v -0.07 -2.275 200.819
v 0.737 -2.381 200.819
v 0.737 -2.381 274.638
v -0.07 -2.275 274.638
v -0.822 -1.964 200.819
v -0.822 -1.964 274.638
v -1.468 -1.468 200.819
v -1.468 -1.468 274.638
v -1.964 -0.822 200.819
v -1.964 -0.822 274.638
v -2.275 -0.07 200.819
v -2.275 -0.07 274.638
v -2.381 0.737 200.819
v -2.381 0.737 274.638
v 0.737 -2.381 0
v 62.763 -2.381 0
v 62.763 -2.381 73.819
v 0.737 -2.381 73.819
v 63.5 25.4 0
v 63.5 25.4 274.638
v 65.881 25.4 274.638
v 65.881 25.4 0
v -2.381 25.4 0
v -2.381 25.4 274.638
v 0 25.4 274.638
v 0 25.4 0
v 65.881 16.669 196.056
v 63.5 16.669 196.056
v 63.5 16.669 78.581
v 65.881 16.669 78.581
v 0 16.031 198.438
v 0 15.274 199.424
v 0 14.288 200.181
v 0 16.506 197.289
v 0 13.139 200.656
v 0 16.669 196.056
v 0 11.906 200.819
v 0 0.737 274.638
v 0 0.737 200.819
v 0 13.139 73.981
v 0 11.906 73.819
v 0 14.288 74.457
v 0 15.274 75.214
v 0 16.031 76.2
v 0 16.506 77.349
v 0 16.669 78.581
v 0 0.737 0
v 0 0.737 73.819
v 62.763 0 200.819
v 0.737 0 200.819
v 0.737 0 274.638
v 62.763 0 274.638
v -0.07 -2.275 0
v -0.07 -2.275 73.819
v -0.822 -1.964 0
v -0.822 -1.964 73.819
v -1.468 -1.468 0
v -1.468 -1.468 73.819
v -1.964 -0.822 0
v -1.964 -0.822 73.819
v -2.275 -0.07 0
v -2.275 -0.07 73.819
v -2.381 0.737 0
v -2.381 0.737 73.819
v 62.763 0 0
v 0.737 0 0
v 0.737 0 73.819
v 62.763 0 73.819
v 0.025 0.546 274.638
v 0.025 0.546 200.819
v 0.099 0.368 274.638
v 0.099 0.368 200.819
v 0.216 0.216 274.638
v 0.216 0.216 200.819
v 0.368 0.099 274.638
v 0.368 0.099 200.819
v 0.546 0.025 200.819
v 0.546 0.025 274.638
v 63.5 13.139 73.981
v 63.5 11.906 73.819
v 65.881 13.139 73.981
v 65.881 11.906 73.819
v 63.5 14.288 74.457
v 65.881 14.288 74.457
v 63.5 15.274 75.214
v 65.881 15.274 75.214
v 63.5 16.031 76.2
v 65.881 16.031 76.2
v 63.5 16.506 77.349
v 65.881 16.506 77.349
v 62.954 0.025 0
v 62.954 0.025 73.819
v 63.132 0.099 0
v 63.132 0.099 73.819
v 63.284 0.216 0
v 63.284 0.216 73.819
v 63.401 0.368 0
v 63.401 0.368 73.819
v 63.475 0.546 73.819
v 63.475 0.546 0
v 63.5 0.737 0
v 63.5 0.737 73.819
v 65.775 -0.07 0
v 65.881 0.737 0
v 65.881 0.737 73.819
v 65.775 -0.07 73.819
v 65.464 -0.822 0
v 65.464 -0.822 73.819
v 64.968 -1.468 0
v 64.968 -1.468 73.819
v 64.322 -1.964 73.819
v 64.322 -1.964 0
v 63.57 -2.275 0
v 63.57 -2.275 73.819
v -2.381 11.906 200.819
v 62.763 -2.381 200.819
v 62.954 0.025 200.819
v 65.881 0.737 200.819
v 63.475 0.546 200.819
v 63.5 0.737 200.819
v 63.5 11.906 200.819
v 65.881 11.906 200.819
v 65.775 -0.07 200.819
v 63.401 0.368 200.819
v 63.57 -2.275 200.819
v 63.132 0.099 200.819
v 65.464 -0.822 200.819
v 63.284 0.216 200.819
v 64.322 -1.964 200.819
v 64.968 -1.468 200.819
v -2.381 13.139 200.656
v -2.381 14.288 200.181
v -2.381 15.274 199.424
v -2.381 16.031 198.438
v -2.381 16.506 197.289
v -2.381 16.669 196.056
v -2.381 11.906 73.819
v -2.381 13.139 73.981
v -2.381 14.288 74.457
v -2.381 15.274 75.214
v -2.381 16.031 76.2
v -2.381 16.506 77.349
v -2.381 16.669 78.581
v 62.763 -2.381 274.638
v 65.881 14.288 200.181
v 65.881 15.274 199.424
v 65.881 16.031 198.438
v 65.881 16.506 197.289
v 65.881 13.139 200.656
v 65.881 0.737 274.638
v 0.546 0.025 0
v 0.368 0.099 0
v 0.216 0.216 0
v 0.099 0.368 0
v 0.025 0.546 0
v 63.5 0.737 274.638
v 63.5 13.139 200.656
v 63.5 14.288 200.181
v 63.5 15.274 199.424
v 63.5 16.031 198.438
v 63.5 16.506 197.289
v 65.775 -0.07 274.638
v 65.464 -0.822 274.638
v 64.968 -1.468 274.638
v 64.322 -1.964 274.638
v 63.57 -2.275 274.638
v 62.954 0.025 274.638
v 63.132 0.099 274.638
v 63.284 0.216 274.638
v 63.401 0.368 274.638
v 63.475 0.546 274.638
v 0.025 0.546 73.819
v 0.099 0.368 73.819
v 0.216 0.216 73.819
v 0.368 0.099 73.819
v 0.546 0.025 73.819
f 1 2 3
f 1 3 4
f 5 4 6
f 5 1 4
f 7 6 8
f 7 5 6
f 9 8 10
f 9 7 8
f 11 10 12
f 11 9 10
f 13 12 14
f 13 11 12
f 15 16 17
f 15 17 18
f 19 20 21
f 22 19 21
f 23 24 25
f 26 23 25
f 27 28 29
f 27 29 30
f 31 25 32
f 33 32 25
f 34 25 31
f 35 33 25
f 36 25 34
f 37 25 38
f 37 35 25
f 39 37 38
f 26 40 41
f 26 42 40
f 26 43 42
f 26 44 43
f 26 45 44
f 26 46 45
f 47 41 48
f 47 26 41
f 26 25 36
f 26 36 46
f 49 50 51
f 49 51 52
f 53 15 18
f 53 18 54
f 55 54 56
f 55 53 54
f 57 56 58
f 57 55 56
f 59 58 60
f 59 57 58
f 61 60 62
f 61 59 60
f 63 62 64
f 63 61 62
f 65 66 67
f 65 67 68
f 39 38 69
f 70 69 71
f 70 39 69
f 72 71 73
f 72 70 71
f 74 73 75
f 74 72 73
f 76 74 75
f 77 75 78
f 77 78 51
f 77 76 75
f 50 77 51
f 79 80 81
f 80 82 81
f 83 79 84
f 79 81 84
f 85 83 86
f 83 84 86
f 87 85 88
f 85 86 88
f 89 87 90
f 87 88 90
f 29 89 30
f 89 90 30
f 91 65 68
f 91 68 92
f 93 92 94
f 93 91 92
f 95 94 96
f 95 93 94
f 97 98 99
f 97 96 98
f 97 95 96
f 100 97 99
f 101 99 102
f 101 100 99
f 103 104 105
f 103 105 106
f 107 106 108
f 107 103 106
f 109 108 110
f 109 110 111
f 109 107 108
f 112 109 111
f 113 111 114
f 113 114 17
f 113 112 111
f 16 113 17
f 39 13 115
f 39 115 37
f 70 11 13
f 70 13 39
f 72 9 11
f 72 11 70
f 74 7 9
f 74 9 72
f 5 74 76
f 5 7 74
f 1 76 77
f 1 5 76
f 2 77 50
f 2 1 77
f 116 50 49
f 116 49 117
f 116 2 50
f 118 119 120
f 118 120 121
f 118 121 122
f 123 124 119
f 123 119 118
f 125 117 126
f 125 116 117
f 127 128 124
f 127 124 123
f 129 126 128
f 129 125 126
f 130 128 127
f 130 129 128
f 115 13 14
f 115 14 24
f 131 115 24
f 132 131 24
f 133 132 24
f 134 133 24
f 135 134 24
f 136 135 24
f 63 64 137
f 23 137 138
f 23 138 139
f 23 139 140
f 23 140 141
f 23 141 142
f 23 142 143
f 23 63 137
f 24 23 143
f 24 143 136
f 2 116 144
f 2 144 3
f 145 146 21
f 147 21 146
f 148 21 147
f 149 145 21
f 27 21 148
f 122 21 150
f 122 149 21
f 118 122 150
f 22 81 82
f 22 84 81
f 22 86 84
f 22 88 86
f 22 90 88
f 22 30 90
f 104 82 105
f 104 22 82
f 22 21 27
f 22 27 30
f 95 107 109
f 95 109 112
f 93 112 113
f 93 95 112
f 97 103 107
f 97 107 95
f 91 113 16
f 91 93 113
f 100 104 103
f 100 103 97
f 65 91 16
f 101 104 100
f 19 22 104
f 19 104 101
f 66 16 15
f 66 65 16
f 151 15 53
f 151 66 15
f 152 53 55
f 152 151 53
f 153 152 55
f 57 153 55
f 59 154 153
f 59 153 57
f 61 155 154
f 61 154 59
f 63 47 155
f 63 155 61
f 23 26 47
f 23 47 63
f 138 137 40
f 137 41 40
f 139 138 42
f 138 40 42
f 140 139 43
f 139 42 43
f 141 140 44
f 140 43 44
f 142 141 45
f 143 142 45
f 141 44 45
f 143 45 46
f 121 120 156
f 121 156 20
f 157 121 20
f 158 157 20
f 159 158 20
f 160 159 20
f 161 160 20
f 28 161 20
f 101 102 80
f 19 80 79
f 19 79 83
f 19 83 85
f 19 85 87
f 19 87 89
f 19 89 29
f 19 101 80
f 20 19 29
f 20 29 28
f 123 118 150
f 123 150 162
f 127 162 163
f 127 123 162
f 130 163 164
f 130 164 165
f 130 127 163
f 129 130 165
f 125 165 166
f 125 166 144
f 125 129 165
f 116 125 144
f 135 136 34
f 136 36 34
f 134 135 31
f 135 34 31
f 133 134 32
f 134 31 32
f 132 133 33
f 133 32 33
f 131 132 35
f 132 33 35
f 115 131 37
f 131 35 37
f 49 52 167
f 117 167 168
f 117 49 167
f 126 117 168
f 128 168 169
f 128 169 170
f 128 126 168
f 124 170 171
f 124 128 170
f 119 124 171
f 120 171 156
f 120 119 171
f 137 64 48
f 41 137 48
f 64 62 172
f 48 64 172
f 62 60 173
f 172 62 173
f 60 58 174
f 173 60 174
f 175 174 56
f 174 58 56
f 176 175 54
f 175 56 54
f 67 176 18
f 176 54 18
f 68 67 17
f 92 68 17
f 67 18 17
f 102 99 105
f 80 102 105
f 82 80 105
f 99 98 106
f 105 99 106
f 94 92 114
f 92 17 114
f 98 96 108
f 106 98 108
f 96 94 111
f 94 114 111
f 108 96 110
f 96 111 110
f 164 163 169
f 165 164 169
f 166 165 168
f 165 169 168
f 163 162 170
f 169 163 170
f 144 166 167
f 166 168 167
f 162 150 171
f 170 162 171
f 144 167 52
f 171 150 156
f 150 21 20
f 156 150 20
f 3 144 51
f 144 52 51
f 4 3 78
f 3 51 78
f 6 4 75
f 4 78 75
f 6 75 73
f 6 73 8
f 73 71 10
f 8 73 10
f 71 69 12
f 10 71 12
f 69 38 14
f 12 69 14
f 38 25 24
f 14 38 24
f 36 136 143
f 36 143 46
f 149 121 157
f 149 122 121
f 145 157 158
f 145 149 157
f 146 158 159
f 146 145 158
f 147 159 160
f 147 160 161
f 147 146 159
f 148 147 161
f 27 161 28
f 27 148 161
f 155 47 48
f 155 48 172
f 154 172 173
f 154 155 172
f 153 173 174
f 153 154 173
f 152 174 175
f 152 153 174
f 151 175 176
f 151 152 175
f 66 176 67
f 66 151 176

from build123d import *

# Parameters (mm, degrees)
BASE_FLANGE1_DEPTH = 274.6375
SKETCH2_W          = 91.44
SKETCH2_H          = 127
CUT_EXTRUDE1_DEPTH = 19.05
FILLET1_R          = 4.7625


# Sheet-metal steps are written as plain solids
with BuildPart() as part:
    # Sketch1 → Base-Flange1 (new body)
    with BuildSketch(Plane.XY):
        with BuildLine():
            Line((0, 25.4), (0, 0.7366))
            ThreePointArc((0, 0.7366), (0.215745145, 0.215745145), (0.7366, 0))
            Line((0.7366, 0), (62.7634, 0))
            ThreePointArc((62.7634, 0), (63.284254855, 0.215745145), (63.5, 0.7366))
            Line((63.5, 0.7366), (63.5, 25.4))
            Line((63.5, 25.4), (65.88125, 25.4))
            Line((65.88125, 25.4), (65.88125, 0.7366))
            ThreePointArc((65.88125, 0.7366), (64.968052878, -1.468052878), (62.7634, -2.38125))
            Line((62.7634, -2.38125), (0.7366, -2.38125))
            ThreePointArc((0.7366, -2.38125), (-1.468052878, -1.468052878), (-2.38125, 0.7366))
            Line((-2.38125, 0.7366), (-2.38125, 25.4))
            Line((-2.38125, 25.4), (0, 25.4))
        make_face()
    extrude(amount=BASE_FLANGE1_DEPTH)

    # Sketch2 → Cut-Extrude1 (cut)
    with BuildSketch(Plane.XZ.offset(2.38125)):
        with Locations((31.75, 137.31875)):
            Rectangle(SKETCH2_W, SKETCH2_H)
    extrude(amount=-CUT_EXTRUDE1_DEPTH, mode=Mode.SUBTRACT)

    # Fillet1
    fillet1_edges = [part.edges().sort_by_distance(p)[0] for p in [
        (-1.190625, 16.66875, 73.81875),
        (64.690625, 16.66875, 73.81875),
        (64.690625, 16.66875, 200.81875),
        (-1.190625, 16.66875, 200.81875),
    ]]
    fillet(fillet1_edges, radius=FILLET1_R)


solid = part.part
